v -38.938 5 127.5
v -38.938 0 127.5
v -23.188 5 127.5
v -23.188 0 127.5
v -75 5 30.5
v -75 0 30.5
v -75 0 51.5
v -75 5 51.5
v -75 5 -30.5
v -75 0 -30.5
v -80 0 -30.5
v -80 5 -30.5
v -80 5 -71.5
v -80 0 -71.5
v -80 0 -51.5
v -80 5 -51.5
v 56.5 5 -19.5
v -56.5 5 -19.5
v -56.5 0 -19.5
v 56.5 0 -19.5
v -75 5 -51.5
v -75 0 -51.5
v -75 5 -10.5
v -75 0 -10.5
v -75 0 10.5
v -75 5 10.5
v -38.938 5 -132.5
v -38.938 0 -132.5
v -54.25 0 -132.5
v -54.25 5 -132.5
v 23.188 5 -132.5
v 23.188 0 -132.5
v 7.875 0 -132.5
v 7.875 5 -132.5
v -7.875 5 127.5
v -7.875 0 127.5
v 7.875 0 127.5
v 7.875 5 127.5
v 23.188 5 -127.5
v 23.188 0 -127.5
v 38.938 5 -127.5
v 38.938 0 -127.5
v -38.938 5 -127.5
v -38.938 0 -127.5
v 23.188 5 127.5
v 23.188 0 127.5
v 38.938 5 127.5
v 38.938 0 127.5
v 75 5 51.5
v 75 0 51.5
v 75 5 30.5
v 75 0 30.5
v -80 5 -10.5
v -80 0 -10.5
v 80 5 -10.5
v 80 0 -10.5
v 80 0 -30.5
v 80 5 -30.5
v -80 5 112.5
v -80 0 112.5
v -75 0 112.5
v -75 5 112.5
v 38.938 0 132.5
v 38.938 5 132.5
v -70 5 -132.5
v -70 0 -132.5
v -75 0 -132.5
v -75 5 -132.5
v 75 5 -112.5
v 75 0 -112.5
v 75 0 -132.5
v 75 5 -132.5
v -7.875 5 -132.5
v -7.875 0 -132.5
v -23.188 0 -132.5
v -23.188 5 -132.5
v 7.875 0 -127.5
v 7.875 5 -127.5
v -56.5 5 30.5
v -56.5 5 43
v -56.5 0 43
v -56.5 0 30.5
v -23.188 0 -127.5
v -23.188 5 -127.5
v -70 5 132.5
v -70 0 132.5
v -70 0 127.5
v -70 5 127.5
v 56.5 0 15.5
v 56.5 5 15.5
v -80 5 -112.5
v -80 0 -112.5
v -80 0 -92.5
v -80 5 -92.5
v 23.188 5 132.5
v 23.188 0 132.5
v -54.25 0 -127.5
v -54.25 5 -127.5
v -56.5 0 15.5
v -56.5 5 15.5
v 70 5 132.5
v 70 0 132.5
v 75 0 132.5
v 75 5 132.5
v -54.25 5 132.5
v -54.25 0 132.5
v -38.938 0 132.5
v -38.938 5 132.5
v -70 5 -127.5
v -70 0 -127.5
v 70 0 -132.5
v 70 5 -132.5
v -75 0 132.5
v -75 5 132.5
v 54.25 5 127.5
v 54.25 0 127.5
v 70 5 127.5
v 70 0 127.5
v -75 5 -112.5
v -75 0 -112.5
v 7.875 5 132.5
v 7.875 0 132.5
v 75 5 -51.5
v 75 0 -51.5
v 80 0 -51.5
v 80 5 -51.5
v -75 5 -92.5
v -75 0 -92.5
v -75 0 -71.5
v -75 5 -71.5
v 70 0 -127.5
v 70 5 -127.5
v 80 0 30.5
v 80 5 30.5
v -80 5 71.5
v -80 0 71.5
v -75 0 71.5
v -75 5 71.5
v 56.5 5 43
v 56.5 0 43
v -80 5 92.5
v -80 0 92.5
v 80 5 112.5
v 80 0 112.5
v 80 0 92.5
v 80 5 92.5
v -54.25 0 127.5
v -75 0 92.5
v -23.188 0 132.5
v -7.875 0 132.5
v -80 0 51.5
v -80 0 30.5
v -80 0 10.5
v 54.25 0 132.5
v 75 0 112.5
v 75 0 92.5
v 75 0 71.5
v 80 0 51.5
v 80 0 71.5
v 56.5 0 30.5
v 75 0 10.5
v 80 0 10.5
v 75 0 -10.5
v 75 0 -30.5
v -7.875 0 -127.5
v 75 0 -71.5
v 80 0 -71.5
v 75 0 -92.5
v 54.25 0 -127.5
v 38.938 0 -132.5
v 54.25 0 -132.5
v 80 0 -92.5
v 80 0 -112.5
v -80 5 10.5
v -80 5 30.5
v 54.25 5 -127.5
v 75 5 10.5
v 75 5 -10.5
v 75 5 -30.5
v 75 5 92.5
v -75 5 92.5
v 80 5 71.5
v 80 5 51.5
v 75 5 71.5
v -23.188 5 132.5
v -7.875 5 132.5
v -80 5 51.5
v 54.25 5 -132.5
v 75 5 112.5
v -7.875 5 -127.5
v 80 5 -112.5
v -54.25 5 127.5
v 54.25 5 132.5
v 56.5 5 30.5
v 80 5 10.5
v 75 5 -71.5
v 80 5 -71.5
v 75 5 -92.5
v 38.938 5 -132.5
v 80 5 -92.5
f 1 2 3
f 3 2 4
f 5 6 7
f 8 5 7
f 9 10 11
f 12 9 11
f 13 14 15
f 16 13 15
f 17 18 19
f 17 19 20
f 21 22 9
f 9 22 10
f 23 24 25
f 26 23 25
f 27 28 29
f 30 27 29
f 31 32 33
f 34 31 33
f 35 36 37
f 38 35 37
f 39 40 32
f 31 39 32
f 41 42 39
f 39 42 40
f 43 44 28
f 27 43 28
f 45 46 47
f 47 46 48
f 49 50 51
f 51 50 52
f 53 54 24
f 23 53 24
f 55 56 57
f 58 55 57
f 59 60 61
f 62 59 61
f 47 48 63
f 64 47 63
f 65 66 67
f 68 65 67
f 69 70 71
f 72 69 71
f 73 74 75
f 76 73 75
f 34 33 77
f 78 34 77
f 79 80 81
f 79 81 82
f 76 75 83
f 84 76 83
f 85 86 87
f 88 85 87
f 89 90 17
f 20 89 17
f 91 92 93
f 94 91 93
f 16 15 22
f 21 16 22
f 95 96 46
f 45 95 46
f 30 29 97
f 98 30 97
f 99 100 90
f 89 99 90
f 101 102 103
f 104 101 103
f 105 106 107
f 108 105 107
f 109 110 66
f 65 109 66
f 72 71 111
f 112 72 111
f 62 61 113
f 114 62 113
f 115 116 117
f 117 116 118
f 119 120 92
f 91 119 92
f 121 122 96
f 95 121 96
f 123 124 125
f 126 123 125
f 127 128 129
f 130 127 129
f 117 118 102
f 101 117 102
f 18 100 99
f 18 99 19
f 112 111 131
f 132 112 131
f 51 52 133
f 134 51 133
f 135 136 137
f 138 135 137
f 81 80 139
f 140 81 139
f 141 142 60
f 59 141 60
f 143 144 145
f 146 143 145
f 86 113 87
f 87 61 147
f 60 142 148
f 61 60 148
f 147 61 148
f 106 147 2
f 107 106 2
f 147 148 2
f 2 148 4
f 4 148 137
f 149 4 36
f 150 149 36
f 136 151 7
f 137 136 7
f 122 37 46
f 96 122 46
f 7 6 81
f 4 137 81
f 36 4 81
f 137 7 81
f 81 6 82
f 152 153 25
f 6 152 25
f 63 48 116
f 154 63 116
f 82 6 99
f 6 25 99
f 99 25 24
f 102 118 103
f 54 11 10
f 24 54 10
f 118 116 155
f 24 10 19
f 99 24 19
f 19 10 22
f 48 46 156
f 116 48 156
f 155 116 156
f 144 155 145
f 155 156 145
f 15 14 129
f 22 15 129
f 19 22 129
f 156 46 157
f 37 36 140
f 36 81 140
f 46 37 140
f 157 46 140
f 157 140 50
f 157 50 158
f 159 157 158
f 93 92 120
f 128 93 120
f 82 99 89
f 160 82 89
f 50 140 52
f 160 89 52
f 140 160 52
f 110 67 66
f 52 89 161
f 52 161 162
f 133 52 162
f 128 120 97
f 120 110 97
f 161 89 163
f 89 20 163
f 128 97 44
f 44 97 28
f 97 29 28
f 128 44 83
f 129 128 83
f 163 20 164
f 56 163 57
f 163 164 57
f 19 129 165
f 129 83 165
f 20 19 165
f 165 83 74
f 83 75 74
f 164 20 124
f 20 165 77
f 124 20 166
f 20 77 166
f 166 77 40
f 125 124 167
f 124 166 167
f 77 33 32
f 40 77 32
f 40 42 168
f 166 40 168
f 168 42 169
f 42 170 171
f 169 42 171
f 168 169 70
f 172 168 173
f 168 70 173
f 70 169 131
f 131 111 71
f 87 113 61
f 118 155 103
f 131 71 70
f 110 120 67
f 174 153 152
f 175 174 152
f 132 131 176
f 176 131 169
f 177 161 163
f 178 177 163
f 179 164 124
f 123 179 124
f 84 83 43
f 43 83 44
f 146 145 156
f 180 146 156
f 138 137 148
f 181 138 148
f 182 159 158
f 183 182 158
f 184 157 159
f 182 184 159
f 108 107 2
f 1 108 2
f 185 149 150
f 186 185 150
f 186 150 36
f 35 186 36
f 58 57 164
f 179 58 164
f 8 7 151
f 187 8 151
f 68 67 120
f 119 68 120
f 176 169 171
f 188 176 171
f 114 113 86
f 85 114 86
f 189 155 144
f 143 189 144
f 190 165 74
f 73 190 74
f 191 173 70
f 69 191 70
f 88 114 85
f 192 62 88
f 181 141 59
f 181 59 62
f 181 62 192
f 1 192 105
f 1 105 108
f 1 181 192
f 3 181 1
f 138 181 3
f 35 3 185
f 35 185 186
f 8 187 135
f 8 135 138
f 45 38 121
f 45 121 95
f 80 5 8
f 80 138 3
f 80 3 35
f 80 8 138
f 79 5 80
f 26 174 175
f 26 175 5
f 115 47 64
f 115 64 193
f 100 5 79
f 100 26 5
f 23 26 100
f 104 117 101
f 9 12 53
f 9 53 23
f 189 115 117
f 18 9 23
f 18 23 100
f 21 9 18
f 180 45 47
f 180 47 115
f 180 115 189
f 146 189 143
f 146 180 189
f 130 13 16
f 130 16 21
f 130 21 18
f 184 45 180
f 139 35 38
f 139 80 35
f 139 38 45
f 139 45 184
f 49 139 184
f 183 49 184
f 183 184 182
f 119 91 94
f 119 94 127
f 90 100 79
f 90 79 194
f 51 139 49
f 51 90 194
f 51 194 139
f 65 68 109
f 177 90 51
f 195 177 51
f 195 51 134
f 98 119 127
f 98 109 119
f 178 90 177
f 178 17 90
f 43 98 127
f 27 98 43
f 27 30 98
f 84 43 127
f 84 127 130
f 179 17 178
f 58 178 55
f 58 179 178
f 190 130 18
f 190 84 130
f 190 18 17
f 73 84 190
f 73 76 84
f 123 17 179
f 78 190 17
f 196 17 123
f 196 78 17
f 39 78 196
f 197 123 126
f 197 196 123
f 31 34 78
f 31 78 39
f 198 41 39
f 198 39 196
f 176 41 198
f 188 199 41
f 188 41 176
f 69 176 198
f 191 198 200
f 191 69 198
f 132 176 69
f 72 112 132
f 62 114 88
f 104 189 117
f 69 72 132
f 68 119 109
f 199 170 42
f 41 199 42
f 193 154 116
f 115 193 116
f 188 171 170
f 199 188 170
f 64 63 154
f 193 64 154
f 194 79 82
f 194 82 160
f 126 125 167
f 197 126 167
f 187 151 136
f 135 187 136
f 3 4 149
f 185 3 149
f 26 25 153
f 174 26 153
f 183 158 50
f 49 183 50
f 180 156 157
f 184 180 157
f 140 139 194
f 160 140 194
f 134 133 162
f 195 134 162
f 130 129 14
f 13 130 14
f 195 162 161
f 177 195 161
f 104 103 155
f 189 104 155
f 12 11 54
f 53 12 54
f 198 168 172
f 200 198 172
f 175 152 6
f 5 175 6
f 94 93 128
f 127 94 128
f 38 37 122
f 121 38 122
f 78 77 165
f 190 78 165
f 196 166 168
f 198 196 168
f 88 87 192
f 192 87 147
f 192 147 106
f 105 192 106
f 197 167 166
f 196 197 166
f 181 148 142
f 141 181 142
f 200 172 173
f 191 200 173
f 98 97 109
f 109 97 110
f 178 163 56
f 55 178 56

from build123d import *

# Parameters (mm, degrees)
BOSS_EXTRUDE1_DEPTH = 5
SKETCH2_W           = 113
SKETCH2_H           = 35
SKETCH2_H_2         = 12.5
CUT_EXTRUDE1_DEPTH  = 10


with BuildPart() as part:
    # Sketch1 → Boss-Extrude1 (new body)
    with BuildSketch(Plane(origin=(0, 0, 0), x_dir=(1, 0, 0), z_dir=(0, 1, 0))):
        Polygon((-80, 71.5), (-80, 51.5), (-75, 51.5), (-75, 30.5), (-80, 30.5), (-80, 10.5), (-75, 10.5), (-75, -10.5), (-80, -10.5), (-80, -30.5), (-75, -30.5), (-75, -51.5), (-80, -51.5), (-80, -71.5), (-75, -71.5), (-75, -92.5), (-80, -92.5), (-80, -112.5), (-75, -112.5), (-75, -132.5), (-70, -132.5), (-70, -127.5), (-54.25, -127.5), (-54.25, -132.5), (-38.9375, -132.5), (-38.9375, -127.5), (-23.1875, -127.5), (-23.1875, -132.5), (-7.875, -132.5), (-7.875, -127.5), (7.875, -127.5), (7.875, -132.5), (23.1875, -132.5), (23.1875, -127.5), (38.9375, -127.5), (38.9375, -132.5), (54.25, -132.5), (54.25, -127.5), (70, -127.5), (70, -132.5), (75, -132.5), (75, -112.5), (80, -112.5), (80, -92.5), (75, -92.5), (75, -71.5), (80, -71.5), (80, -51.5), (75, -51.5), (75, -30.5), (80, -30.5), (80, -10.5), (75, -10.5), (75, 10.5), (80, 10.5), (80, 30.5), (75, 30.5), (75, 51.5), (80, 51.5), (80, 71.5), (75, 71.5), (75, 92.5), (80, 92.5), (80, 112.5), (75, 112.5), (75, 132.5), (70, 132.5), (70, 127.5), (54.25, 127.5), (54.25, 132.5), (38.9375, 132.5), (38.9375, 127.5), (23.1875, 127.5), (23.1875, 132.5), (7.875, 132.5), (7.875, 127.5), (-7.875, 127.5), (-7.875, 132.5), (-23.1875, 132.5), (-23.1875, 127.5), (-38.9375, 127.5), (-38.9375, 132.5), (-54.25, 132.5), (-54.25, 127.5), (-70, 127.5), (-70, 132.5), (-75, 132.5), (-75, 112.5), (-80, 112.5), (-80, 92.5), (-75, 92.5), (-75, 71.5), align=None)
    extrude(amount=BOSS_EXTRUDE1_DEPTH)

    # Sketch2 → Cut-Extrude1 (cut)
    with BuildSketch(Plane(origin=(0, 5, 0), x_dir=(1, 0, 0), z_dir=(0, 1, 0))):
        with Locations((0, 2)):
            Rectangle(SKETCH2_W, SKETCH2_H)
        with Locations((0, -36.75)):
            Rectangle(SKETCH2_W, SKETCH2_H_2)
    extrude(amount=-CUT_EXTRUDE1_DEPTH, mode=Mode.SUBTRACT)


solid = part.part
